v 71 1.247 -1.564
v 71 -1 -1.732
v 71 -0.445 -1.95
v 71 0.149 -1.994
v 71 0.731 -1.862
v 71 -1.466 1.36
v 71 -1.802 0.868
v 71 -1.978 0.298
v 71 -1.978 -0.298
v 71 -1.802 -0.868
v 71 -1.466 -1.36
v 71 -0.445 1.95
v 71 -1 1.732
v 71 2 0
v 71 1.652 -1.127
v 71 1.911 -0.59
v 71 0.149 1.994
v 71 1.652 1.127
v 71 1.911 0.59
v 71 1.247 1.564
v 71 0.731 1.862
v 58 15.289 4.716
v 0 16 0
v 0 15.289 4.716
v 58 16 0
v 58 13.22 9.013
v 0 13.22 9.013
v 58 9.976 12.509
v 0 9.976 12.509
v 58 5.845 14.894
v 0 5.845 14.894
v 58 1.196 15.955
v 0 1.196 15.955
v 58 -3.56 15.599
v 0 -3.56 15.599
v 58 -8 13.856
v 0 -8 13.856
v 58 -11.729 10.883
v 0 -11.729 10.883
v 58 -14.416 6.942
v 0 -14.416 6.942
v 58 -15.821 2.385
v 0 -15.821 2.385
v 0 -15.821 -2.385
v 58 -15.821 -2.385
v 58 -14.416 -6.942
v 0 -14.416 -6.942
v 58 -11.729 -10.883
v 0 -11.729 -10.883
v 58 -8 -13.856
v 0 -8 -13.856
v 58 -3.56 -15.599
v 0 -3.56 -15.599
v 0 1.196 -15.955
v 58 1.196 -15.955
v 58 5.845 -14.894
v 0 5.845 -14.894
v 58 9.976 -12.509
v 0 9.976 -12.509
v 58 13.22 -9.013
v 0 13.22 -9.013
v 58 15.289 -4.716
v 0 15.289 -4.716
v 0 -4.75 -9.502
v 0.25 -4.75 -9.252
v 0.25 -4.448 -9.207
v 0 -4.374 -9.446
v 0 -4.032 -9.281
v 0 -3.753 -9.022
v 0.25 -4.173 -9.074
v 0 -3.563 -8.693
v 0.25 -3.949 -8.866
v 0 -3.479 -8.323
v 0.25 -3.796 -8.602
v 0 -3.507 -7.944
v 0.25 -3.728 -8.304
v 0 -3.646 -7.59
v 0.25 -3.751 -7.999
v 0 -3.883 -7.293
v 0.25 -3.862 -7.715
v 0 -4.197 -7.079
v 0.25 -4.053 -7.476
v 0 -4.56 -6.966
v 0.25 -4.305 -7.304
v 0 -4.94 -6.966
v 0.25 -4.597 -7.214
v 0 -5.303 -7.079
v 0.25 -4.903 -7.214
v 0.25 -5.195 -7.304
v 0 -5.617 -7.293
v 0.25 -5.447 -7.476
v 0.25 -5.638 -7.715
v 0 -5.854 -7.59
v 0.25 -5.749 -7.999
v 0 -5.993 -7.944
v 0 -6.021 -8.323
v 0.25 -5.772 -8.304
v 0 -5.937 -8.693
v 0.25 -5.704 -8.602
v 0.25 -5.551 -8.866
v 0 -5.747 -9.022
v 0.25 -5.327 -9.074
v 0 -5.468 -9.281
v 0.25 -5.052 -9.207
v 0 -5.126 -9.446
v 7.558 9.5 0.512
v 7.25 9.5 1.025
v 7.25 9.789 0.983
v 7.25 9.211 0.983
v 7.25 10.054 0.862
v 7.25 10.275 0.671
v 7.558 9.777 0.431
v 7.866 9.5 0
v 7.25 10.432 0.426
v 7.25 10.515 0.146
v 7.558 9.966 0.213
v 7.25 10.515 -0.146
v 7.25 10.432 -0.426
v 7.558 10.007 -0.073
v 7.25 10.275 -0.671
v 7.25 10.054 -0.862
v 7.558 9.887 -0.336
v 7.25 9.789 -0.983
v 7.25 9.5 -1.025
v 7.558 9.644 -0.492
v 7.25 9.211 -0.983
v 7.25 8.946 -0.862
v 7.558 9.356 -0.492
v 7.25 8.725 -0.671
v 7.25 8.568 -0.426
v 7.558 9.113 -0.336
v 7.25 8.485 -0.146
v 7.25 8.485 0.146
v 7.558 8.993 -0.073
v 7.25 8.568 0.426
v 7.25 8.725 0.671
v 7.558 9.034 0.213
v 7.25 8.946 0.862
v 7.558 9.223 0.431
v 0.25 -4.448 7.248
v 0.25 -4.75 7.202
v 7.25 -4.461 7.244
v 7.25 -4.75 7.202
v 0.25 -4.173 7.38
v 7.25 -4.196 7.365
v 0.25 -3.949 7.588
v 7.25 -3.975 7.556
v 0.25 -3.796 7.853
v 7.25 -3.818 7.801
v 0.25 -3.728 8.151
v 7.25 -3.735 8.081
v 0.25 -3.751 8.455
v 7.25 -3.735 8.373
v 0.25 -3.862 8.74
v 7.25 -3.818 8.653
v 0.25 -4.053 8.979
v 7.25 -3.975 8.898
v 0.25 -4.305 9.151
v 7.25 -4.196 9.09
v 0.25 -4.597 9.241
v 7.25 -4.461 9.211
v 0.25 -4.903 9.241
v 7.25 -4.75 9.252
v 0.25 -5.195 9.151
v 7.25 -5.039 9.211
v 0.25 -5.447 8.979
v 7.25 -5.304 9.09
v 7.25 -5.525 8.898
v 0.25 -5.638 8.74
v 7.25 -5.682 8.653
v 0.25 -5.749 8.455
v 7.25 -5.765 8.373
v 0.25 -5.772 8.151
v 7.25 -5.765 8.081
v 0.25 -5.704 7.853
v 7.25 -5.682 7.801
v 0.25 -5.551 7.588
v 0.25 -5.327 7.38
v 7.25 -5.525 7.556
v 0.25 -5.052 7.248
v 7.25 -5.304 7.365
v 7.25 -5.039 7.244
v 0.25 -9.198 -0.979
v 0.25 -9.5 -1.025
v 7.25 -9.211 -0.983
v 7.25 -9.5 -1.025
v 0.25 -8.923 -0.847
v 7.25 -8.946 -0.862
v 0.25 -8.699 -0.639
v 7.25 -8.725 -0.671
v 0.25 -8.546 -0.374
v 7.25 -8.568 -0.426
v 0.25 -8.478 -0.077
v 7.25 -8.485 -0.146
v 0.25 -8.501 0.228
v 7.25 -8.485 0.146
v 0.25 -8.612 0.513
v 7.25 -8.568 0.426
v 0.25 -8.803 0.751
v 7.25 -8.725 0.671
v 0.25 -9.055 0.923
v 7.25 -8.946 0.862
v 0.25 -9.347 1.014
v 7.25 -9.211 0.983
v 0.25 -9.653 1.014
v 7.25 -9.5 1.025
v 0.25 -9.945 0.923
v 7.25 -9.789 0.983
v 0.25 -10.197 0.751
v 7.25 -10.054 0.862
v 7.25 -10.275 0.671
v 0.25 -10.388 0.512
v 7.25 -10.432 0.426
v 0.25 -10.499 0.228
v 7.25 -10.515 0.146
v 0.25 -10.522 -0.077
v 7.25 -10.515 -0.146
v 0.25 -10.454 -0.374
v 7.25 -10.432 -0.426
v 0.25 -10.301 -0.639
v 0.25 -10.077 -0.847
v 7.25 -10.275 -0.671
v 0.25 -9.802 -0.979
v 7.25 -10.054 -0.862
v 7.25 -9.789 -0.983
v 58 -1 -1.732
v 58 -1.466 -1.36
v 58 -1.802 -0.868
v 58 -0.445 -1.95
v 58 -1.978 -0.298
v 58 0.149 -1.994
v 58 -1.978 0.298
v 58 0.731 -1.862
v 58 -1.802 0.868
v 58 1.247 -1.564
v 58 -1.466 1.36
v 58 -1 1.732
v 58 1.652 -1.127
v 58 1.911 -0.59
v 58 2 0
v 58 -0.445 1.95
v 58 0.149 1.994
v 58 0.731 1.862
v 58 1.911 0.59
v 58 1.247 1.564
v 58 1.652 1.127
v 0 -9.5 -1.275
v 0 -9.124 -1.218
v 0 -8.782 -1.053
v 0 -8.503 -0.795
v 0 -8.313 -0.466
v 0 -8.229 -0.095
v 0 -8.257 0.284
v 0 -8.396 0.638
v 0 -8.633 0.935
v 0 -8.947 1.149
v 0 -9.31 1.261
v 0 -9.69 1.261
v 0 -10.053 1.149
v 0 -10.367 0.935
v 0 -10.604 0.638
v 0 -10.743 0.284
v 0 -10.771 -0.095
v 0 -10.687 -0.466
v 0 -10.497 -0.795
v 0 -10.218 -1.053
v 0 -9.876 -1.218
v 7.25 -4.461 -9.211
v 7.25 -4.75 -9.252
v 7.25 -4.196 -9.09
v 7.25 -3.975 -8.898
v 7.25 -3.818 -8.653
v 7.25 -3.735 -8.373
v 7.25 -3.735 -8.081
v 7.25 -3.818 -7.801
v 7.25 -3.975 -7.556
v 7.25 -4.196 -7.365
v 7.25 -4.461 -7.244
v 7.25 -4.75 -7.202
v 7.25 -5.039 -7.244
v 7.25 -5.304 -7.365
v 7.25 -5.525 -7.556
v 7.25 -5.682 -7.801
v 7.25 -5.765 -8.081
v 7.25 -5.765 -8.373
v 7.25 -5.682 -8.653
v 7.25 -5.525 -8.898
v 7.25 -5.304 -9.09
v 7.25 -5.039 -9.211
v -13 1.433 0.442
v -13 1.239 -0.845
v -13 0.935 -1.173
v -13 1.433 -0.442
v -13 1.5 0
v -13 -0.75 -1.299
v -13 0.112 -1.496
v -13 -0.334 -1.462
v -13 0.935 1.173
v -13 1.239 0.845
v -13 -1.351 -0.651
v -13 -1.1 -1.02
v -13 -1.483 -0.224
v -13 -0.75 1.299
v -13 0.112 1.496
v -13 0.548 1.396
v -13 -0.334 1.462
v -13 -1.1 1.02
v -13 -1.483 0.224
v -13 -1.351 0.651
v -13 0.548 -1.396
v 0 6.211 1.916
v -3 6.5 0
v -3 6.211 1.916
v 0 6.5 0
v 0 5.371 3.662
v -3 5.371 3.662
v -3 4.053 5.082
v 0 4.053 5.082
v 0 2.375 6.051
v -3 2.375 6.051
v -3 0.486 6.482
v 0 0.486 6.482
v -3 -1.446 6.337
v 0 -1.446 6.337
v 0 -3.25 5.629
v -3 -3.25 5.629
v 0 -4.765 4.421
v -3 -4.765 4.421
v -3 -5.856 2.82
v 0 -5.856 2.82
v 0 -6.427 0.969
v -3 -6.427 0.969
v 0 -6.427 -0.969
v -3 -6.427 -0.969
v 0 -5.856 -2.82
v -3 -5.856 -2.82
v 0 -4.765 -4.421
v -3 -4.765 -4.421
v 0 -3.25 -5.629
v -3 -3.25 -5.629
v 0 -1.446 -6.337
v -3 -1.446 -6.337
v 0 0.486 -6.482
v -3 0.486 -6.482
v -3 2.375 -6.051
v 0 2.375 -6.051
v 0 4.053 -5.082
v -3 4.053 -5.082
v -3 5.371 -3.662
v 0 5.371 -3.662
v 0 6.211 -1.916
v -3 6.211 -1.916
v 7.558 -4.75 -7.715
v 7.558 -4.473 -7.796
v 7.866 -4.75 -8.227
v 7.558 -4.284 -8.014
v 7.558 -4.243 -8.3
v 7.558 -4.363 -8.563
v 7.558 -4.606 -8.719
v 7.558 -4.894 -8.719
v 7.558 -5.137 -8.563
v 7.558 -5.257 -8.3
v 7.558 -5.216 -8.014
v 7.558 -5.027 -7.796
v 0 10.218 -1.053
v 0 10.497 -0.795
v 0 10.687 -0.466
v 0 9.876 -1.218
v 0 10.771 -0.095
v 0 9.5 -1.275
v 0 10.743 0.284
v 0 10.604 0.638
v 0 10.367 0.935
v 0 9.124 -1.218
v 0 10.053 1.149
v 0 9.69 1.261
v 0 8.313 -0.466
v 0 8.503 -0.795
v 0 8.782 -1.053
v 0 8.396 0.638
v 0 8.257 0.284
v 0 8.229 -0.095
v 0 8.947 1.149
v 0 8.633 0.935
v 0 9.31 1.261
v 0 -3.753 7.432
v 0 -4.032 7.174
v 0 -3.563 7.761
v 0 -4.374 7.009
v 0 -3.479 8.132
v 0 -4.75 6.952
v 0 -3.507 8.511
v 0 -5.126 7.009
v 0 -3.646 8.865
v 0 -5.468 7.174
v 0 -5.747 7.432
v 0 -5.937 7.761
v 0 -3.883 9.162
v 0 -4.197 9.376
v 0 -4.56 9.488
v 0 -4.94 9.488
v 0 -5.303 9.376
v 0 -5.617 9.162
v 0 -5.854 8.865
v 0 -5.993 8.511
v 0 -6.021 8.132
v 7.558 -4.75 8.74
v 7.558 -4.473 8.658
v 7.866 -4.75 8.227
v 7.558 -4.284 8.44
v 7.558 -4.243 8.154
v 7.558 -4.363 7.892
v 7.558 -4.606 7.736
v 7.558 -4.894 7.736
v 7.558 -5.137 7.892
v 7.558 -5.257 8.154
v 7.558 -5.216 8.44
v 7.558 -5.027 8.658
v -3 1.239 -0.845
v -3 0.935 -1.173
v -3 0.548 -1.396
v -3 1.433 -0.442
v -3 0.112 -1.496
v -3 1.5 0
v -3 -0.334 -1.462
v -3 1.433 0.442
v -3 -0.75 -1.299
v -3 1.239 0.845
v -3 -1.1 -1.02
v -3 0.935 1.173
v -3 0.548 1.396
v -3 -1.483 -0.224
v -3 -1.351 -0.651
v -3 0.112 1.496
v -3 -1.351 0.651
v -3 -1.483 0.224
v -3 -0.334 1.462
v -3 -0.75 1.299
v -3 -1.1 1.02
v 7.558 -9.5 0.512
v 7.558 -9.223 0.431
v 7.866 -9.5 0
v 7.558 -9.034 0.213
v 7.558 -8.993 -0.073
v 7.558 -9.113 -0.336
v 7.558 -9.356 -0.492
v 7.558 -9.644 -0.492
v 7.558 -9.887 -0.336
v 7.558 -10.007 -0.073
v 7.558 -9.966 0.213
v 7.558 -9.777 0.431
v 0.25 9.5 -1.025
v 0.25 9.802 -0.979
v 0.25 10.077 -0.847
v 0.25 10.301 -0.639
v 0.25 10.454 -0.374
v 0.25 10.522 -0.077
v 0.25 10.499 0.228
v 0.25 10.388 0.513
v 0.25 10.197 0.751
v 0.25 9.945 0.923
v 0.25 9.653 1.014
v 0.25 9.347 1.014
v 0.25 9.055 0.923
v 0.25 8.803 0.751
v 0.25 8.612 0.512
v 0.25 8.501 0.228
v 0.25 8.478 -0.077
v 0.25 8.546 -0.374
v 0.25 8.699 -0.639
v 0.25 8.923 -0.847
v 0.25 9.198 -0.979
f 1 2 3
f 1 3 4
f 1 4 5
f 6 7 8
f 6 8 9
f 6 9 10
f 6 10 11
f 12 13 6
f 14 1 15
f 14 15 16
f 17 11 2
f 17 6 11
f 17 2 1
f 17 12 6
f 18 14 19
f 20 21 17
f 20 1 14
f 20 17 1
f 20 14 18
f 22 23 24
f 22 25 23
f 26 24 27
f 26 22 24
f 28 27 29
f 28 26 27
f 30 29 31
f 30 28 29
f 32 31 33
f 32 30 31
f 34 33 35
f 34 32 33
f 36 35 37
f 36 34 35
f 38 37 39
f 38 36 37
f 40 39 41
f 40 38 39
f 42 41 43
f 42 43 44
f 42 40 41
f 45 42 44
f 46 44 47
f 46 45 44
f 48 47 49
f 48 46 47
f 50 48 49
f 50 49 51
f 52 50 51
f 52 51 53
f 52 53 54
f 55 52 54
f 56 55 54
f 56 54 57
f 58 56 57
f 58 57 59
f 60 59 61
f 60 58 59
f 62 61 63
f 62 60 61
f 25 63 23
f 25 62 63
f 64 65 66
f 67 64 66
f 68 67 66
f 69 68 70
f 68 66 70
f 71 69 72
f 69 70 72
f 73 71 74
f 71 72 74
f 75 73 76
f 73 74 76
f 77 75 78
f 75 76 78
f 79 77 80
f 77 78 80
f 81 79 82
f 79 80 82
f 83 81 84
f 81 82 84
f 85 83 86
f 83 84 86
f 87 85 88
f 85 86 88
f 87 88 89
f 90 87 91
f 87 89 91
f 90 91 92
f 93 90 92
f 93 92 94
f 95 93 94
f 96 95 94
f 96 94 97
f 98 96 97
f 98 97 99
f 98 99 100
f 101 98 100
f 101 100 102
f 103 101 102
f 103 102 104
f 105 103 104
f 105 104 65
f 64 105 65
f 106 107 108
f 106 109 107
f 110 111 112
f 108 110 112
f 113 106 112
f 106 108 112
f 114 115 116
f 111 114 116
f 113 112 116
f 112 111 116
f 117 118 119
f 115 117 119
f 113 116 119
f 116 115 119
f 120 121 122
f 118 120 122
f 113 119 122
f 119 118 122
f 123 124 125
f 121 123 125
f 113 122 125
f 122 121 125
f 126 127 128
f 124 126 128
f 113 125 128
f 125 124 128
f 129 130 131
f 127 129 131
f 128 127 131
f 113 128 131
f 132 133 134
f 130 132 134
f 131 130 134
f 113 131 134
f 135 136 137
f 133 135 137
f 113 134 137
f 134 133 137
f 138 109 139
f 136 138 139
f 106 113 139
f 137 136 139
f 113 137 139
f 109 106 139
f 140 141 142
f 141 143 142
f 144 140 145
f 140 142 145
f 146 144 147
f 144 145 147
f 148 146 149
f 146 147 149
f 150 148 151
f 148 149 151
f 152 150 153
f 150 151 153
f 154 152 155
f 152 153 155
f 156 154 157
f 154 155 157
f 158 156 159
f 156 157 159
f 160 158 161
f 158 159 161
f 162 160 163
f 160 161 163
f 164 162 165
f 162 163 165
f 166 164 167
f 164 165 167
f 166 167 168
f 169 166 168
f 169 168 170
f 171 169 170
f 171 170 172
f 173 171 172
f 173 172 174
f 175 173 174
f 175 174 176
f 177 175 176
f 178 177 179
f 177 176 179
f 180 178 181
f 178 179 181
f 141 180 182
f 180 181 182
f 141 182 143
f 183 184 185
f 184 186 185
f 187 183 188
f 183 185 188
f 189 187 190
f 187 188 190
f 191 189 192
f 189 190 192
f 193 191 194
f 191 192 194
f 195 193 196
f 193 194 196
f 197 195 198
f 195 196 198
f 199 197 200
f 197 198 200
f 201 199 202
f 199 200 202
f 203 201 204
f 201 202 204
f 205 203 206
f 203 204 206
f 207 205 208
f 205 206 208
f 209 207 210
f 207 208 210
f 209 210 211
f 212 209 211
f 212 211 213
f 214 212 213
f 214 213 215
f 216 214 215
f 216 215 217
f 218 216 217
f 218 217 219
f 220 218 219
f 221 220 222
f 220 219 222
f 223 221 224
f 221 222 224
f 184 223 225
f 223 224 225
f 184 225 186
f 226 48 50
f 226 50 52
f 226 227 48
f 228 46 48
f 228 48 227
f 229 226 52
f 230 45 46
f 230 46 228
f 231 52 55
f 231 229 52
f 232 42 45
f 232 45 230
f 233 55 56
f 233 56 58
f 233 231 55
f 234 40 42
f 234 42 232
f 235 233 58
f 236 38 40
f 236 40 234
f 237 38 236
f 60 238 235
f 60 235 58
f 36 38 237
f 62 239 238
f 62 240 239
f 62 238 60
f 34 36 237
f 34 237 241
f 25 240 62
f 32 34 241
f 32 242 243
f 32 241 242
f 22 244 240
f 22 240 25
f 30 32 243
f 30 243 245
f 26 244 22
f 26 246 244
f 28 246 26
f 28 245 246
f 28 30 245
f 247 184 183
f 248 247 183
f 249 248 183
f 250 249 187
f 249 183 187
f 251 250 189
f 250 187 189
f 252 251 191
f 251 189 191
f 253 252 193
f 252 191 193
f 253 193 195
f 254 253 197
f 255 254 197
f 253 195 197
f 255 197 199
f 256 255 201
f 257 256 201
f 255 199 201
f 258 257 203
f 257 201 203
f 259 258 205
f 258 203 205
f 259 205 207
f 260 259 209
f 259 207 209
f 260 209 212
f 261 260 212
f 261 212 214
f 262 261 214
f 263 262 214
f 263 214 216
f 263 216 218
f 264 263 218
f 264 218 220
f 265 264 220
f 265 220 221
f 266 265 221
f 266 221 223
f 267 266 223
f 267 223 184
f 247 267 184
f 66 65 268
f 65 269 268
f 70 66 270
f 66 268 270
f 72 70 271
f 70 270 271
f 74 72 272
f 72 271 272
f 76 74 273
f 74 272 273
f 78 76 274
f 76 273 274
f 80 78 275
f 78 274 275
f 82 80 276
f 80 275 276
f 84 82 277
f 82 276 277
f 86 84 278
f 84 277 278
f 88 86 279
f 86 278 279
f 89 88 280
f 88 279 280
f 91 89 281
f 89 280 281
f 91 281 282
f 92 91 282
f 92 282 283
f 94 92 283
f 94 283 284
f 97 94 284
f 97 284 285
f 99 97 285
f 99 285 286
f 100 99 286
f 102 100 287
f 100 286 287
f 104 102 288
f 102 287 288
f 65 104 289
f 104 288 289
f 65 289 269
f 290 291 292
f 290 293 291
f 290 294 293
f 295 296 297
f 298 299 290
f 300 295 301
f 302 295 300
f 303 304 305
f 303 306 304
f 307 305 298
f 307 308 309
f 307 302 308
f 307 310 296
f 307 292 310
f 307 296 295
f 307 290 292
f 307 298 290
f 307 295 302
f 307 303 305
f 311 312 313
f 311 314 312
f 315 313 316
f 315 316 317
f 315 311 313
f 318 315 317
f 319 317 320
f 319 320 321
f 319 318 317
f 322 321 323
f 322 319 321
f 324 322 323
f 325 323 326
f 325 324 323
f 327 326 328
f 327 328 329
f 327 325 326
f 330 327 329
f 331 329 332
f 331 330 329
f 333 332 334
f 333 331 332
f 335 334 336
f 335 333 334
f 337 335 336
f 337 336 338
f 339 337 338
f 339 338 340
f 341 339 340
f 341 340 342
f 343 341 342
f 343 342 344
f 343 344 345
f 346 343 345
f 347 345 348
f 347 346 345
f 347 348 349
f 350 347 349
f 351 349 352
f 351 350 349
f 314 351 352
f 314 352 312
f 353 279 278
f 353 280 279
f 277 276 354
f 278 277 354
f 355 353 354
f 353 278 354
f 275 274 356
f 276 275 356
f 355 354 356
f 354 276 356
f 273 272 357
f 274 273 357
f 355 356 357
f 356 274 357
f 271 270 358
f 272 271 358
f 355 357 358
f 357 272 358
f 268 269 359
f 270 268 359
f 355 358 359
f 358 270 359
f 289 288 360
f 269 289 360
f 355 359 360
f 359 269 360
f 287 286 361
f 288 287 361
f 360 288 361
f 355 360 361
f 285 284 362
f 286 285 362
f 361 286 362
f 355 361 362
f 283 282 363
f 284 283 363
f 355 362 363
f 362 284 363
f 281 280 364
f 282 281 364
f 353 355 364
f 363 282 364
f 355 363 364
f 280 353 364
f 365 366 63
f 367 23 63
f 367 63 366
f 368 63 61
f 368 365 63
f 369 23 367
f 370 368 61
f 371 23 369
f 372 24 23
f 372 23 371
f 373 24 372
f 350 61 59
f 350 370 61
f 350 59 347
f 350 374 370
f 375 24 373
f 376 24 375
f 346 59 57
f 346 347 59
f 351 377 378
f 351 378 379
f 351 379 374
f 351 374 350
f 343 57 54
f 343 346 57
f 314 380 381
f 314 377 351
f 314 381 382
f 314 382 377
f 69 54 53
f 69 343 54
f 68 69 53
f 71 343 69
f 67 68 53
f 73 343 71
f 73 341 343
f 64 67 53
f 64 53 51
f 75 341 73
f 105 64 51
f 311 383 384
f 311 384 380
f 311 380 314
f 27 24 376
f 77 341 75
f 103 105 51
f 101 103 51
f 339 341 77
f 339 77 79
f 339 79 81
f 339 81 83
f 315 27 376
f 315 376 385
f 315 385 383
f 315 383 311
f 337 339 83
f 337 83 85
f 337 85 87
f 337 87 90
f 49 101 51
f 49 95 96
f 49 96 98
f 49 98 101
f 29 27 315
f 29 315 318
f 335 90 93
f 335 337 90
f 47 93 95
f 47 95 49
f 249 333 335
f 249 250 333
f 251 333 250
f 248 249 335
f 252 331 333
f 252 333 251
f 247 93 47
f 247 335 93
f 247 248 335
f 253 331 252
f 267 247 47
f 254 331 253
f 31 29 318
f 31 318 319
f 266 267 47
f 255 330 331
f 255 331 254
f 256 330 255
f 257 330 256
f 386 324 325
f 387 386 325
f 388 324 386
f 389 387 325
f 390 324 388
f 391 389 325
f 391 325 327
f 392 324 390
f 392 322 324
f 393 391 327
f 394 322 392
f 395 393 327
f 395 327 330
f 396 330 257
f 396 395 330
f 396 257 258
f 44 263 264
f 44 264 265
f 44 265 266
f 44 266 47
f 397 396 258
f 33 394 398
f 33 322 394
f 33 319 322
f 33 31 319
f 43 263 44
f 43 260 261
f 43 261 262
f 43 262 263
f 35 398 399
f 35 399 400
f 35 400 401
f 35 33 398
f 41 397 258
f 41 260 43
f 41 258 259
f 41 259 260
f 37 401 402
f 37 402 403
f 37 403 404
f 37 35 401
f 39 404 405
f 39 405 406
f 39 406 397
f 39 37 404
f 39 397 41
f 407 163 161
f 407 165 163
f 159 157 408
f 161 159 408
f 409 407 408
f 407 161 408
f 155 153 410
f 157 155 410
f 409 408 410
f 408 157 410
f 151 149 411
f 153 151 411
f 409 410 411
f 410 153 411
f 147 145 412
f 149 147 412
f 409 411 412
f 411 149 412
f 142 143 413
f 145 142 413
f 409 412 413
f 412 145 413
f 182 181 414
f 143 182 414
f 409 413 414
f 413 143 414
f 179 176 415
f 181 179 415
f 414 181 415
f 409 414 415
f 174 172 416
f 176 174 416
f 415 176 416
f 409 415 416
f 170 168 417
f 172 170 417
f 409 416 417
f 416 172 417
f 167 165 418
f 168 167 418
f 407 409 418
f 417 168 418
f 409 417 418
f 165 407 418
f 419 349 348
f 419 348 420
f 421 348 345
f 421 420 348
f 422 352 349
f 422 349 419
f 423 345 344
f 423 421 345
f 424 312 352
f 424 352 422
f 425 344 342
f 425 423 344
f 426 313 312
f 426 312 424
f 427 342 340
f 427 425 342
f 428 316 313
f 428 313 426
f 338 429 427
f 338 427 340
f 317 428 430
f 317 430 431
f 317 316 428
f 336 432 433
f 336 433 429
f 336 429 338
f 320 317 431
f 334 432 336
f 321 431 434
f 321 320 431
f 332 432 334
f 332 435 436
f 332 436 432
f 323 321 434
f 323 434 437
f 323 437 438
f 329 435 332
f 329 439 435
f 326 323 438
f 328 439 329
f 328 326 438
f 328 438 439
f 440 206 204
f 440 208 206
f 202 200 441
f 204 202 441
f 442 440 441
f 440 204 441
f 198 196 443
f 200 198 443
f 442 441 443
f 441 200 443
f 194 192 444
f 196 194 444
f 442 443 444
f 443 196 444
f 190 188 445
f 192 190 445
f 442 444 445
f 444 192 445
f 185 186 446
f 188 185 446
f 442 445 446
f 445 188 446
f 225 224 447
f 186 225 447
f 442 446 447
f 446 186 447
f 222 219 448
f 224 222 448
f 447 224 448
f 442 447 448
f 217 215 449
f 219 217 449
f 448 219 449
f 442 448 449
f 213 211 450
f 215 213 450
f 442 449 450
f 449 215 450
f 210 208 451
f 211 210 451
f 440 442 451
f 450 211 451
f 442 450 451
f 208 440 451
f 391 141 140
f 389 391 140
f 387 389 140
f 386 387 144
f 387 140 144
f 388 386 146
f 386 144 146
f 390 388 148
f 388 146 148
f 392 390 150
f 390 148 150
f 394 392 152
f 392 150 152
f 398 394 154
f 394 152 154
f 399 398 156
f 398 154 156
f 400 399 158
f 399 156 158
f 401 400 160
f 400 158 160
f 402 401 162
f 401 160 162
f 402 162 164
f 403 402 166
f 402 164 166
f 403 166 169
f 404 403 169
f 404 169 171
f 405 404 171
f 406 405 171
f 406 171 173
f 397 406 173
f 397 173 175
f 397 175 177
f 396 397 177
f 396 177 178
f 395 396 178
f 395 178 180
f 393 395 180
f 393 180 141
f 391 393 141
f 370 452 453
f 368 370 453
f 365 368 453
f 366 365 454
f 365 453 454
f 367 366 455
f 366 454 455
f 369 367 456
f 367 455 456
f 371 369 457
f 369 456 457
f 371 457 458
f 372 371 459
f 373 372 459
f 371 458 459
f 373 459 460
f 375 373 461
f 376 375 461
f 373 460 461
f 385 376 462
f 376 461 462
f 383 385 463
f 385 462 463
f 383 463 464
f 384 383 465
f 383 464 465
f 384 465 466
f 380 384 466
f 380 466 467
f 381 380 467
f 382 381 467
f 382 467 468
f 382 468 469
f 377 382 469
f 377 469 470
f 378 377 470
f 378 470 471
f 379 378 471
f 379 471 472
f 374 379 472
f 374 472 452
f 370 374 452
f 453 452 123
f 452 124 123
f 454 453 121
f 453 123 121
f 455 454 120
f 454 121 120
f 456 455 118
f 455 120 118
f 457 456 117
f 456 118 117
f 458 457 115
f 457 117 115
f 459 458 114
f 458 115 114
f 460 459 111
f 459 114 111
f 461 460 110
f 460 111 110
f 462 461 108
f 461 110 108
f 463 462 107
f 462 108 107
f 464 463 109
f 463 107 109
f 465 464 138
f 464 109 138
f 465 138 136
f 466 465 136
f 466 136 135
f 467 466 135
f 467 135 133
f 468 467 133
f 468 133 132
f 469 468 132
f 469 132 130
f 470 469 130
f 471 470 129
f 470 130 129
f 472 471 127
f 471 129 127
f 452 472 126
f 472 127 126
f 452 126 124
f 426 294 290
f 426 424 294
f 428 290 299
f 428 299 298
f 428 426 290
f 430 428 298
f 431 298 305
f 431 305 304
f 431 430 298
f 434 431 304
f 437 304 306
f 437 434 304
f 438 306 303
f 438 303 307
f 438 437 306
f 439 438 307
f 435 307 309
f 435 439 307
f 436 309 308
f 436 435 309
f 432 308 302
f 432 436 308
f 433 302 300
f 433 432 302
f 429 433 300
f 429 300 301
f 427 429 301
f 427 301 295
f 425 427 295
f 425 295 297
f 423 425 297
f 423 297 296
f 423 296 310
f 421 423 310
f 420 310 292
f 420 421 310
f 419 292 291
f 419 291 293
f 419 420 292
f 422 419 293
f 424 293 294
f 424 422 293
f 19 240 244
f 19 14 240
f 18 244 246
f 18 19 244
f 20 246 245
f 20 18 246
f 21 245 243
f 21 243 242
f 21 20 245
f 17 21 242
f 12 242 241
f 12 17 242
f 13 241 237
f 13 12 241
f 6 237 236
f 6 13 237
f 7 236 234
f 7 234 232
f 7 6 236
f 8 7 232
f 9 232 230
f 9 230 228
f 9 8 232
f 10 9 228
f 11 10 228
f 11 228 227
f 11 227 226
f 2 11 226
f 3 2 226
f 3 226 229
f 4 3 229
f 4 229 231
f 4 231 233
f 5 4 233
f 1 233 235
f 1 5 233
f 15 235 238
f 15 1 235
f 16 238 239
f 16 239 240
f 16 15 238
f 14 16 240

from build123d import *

# Parameters (mm, degrees)
TROU_TARAUD_M2_5X0_451_D           = 2.05
TROU_TARAUD_M2_5X0_451_DEPTH       = 7.25
TROU_TARAUD_M2_5X0_451_CSINK_D     = 2.55
TROU_TARAUD_M2_5X0_451_CSINK_ANGLE = 90
TROU_TARAUD_M2_5X0_451_TIP         = 0.615882135


with BuildPart() as part:
    # Esquisse1 → Révolution1 (revolve)
    with BuildSketch(Plane.XY):
        Polygon((0, 16), (58, 16), (58, 2), (71, 2), (71, 0), (-13, 0), (-13, 1.5), (-3, 1.5), (-3, 6.5), (0, 6.5), align=None)
    revolve(axis=Axis((-42.470383275, 0, 0), (1, 0, 0)))

    # Trou taraudé M2.5x0.451
    with Locations(Plane.ZY):
        with Locations((0, 9.5), (-8.227241336, -4.75), (8.227241336, -4.75), (0, -9.5)):
            CounterSinkHole(TROU_TARAUD_M2_5X0_451_D / 2, TROU_TARAUD_M2_5X0_451_CSINK_D / 2, depth=TROU_TARAUD_M2_5X0_451_DEPTH, counter_sink_angle=TROU_TARAUD_M2_5X0_451_CSINK_ANGLE)
            with Locations((0, 0, -(TROU_TARAUD_M2_5X0_451_DEPTH + TROU_TARAUD_M2_5X0_451_TIP / 2))):  # 118° drill point
                Cone(0, TROU_TARAUD_M2_5X0_451_D / 2, TROU_TARAUD_M2_5X0_451_TIP, mode=Mode.SUBTRACT)


solid = part.part
